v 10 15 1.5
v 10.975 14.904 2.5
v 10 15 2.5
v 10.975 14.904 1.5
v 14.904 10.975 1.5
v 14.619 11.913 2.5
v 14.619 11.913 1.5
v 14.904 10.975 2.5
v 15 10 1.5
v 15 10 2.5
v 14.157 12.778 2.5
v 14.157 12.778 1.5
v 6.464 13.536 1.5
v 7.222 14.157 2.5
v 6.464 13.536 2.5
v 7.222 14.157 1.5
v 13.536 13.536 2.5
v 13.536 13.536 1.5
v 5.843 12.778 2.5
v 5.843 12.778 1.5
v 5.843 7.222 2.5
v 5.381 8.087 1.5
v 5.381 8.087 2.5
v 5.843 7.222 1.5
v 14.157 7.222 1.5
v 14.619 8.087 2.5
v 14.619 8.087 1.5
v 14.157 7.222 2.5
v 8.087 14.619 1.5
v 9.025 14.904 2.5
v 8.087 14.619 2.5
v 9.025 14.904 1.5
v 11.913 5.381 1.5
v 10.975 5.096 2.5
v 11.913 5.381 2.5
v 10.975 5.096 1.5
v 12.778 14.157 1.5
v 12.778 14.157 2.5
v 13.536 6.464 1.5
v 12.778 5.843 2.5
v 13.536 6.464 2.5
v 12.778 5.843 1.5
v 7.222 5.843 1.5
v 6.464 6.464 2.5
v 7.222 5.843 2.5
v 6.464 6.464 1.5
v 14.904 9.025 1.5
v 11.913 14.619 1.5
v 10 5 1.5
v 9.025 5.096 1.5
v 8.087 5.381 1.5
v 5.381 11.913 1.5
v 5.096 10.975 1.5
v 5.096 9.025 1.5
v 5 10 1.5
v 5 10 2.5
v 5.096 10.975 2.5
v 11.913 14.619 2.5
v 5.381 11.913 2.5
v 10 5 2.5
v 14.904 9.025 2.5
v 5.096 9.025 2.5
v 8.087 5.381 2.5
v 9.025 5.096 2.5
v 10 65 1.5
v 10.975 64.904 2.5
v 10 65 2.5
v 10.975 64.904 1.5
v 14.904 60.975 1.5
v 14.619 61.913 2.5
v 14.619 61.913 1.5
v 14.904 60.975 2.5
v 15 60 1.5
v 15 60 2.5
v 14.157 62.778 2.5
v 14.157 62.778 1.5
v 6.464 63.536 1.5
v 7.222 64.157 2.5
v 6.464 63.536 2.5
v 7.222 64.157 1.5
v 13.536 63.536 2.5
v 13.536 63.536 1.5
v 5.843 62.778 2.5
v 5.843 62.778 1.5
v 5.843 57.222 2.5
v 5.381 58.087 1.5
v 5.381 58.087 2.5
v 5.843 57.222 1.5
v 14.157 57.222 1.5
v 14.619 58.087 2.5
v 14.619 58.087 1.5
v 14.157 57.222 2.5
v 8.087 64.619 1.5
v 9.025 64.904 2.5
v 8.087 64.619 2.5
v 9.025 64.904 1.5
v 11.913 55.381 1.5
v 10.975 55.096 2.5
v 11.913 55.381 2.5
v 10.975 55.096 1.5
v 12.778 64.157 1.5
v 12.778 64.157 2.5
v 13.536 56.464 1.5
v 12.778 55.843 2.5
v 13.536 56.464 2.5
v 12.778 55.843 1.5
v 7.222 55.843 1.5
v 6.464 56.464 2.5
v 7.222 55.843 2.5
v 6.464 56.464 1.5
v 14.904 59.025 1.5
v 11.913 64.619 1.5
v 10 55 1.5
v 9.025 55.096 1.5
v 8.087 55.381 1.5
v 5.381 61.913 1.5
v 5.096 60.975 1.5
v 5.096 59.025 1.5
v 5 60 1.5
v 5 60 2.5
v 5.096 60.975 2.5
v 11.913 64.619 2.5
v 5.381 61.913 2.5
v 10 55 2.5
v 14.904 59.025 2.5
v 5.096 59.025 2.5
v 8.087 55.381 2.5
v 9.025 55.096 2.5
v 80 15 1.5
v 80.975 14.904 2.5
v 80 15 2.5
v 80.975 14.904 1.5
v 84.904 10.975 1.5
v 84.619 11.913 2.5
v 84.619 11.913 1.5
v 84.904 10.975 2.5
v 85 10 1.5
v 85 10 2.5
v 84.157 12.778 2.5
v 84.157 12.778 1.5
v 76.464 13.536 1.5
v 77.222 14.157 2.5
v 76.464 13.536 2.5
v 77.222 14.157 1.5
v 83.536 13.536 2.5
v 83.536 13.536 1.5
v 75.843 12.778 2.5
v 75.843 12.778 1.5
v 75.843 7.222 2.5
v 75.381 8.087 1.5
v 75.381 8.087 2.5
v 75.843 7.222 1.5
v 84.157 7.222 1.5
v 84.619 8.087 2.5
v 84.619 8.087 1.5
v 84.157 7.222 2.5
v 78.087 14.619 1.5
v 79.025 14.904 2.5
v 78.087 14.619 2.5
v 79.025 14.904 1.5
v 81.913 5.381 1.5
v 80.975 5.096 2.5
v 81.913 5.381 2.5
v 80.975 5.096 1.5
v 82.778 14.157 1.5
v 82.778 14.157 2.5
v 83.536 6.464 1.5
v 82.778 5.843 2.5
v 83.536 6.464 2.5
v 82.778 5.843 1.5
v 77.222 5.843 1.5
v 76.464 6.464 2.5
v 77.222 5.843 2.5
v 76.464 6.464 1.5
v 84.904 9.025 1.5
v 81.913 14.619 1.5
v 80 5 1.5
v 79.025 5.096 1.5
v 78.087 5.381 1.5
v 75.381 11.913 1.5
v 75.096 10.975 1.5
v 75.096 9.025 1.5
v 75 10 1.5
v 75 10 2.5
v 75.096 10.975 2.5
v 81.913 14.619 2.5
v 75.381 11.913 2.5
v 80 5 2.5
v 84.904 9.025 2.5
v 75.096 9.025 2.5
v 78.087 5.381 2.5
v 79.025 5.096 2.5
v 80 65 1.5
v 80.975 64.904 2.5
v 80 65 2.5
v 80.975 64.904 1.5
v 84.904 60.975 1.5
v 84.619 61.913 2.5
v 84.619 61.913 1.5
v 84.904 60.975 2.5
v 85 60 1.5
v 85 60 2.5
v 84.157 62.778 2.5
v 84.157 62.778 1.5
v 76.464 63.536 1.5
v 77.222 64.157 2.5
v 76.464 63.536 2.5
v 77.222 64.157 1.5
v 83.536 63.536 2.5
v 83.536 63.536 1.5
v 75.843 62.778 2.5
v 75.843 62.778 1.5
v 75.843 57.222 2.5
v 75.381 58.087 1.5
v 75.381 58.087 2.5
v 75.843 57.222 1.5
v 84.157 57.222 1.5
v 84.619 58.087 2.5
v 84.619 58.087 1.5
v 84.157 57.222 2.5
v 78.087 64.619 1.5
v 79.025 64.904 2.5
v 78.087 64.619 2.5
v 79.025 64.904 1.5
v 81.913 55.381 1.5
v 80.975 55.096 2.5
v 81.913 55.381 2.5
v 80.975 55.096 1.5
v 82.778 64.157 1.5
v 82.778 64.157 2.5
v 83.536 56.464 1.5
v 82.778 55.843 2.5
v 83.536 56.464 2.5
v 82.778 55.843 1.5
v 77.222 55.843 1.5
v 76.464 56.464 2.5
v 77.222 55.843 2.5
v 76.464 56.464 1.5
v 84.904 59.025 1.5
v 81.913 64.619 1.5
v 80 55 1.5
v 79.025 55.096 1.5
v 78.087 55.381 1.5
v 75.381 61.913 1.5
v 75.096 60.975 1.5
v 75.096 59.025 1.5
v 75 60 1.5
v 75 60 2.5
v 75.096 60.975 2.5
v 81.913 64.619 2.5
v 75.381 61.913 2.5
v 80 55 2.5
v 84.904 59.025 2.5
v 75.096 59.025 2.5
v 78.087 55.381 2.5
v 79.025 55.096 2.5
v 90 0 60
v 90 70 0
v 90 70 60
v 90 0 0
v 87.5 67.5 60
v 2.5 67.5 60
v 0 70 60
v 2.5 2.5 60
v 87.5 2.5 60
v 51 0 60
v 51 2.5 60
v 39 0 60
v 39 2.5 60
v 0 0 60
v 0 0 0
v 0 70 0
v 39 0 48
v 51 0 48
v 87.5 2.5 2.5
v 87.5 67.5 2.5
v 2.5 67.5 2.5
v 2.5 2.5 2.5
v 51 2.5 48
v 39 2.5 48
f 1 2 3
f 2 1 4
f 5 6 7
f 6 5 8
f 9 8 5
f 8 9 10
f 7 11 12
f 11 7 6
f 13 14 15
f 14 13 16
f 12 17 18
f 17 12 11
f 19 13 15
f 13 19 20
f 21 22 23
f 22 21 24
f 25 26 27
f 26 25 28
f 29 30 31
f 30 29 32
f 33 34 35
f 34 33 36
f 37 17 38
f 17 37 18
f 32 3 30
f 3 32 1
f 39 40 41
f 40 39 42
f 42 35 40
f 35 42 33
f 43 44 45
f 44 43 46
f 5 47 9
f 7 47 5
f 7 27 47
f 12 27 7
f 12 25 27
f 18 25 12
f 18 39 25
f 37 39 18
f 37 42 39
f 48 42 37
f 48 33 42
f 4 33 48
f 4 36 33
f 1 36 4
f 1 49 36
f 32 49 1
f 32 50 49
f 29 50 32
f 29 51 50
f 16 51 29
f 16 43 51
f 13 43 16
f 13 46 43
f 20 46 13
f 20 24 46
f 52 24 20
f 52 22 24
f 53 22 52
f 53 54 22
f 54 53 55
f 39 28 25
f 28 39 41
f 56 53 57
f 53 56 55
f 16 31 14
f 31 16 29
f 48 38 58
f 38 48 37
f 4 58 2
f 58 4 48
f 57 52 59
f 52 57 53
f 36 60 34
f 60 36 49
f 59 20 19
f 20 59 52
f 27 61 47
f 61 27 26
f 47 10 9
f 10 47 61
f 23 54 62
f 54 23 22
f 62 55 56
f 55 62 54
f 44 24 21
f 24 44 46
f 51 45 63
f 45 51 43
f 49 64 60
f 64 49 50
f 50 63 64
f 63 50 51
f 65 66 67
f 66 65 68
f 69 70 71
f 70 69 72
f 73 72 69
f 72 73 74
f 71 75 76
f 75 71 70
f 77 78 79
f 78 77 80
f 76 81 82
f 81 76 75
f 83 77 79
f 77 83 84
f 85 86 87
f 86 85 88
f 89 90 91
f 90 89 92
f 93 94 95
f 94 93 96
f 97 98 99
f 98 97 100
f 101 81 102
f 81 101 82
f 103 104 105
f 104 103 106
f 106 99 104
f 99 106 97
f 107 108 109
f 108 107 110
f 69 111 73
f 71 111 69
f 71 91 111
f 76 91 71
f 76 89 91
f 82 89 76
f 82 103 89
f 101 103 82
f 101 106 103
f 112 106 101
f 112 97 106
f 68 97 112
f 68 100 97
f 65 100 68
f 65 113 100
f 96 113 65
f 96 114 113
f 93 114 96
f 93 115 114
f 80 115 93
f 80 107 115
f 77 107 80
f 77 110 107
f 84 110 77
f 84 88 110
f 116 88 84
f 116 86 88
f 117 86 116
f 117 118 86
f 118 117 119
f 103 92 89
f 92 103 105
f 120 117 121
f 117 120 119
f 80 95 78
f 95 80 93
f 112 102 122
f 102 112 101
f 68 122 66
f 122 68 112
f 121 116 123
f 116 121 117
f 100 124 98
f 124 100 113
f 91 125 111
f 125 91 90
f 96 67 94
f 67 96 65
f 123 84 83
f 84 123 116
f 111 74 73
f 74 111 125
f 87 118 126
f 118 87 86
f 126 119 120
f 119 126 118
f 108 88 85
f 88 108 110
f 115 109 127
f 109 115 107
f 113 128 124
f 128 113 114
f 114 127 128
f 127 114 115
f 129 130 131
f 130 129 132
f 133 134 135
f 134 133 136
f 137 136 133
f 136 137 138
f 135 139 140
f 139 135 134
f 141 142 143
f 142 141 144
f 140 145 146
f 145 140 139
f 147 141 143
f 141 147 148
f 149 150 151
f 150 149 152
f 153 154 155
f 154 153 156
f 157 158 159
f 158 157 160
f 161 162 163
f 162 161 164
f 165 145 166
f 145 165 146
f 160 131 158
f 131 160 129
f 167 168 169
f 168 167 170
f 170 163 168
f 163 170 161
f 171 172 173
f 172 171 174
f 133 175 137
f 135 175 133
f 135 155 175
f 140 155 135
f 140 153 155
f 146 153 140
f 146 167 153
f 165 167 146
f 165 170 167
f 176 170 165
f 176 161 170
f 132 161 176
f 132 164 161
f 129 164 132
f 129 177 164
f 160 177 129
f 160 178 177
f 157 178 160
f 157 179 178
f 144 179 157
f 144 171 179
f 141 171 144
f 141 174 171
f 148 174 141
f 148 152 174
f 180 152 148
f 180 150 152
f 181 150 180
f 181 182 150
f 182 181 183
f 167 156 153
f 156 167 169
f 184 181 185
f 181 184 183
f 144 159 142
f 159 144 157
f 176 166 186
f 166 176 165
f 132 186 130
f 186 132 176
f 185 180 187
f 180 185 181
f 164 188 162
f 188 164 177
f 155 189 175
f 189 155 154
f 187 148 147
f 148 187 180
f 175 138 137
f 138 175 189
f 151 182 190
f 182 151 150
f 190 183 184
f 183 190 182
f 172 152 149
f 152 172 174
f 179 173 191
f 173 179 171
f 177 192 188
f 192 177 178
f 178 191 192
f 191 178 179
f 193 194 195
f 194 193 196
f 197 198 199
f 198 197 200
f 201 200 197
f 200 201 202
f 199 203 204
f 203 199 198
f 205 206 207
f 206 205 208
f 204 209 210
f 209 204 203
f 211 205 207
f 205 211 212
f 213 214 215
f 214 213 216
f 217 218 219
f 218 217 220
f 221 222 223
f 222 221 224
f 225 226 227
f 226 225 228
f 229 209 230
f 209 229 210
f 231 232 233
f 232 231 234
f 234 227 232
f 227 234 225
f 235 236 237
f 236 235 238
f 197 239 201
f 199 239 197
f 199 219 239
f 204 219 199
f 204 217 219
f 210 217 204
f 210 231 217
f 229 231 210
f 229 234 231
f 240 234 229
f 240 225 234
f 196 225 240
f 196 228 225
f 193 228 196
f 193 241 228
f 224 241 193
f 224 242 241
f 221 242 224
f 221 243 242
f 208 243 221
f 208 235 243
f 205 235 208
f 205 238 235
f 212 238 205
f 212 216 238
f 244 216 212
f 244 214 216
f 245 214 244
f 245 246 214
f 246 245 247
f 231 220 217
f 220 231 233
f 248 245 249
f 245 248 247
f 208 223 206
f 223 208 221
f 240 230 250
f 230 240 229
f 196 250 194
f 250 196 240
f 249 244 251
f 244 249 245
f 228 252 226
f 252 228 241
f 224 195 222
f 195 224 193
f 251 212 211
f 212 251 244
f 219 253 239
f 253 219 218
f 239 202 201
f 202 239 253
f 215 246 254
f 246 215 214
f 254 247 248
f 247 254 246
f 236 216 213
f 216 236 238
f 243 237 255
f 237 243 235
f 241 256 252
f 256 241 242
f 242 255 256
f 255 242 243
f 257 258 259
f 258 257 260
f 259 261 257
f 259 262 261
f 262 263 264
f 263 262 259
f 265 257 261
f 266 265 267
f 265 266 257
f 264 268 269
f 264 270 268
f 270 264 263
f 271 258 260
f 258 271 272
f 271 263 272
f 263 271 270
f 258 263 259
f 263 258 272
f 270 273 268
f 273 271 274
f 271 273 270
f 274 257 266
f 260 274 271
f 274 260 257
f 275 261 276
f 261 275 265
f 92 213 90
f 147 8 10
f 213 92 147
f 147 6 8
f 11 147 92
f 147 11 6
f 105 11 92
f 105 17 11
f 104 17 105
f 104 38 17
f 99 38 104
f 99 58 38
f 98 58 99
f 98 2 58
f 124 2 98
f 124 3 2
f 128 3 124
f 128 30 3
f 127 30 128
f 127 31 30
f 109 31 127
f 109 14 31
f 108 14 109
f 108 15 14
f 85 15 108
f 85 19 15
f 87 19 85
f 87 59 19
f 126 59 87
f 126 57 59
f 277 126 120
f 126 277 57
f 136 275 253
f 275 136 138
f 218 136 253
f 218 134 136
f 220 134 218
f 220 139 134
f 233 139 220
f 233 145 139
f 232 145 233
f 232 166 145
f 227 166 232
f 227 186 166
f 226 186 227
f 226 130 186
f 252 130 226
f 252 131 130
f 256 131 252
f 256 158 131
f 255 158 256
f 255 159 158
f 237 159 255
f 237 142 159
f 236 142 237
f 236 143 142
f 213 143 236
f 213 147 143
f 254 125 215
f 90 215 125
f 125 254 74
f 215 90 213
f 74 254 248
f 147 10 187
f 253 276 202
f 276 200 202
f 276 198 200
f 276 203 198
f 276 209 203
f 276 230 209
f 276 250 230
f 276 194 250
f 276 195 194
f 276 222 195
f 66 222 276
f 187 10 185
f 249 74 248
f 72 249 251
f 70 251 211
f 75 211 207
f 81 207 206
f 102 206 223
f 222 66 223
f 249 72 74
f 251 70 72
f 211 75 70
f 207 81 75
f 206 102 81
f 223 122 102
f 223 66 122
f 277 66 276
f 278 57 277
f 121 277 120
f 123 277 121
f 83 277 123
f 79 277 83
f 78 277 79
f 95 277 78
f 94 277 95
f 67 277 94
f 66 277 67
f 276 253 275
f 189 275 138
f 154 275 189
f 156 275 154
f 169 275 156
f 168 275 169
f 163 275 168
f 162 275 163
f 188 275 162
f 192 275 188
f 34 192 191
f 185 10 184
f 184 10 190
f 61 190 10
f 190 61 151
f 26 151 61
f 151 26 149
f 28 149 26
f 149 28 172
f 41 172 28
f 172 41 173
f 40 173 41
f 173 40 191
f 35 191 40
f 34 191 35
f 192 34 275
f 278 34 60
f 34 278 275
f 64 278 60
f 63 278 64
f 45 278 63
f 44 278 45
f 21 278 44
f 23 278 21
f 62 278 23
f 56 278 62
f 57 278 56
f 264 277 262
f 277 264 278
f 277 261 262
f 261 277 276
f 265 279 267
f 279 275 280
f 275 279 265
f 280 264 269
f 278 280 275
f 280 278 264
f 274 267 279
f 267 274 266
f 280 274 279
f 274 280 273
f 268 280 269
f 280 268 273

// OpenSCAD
$fn = 32;

// ----------------------------------------------------------------------
// Enclosure box: both enclosure
// ----------------------------------------------------------------------

// --- parameters (mm) ---
box_l = 90;               // outer length, X
box_w = 70;               // outer width, Y
box_h = 60;               // outer height
wall_t = 2.5;             // wall thickness
boss_r = 5;               // corner boss radius
hole_r = 1.5;             // boss screw hole radius
boss_in = 10;             // boss inset from the corners
notch_w = 12;             // cable notch width
notch_h = 12;             // cable notch height

inner_h = box_h - wall_t;  // cavity depth
boss_h = inner_h - 2;  // corner boss height

difference() {
  cube([box_l, box_w, box_h]);
  translate([wall_t, wall_t, wall_t])
    cube([box_l - 2 * wall_t, box_w - 2 * wall_t, box_h]);
  for (sx = [0, 1], sy = [0, 1])
    translate([sx ? box_l - boss_in : boss_in,
               sy ? box_w - boss_in : boss_in, wall_t - 1]) {
      cylinder(r = boss_r, h = boss_h);
      translate([0, 0, boss_h - 4])
        cylinder(r = hole_r, h = 5);
    }
  translate([box_l / 2 - notch_w / 2, -1, box_h - notch_h])
    cube([notch_w, wall_t + 2, notch_h + 1]);
}
